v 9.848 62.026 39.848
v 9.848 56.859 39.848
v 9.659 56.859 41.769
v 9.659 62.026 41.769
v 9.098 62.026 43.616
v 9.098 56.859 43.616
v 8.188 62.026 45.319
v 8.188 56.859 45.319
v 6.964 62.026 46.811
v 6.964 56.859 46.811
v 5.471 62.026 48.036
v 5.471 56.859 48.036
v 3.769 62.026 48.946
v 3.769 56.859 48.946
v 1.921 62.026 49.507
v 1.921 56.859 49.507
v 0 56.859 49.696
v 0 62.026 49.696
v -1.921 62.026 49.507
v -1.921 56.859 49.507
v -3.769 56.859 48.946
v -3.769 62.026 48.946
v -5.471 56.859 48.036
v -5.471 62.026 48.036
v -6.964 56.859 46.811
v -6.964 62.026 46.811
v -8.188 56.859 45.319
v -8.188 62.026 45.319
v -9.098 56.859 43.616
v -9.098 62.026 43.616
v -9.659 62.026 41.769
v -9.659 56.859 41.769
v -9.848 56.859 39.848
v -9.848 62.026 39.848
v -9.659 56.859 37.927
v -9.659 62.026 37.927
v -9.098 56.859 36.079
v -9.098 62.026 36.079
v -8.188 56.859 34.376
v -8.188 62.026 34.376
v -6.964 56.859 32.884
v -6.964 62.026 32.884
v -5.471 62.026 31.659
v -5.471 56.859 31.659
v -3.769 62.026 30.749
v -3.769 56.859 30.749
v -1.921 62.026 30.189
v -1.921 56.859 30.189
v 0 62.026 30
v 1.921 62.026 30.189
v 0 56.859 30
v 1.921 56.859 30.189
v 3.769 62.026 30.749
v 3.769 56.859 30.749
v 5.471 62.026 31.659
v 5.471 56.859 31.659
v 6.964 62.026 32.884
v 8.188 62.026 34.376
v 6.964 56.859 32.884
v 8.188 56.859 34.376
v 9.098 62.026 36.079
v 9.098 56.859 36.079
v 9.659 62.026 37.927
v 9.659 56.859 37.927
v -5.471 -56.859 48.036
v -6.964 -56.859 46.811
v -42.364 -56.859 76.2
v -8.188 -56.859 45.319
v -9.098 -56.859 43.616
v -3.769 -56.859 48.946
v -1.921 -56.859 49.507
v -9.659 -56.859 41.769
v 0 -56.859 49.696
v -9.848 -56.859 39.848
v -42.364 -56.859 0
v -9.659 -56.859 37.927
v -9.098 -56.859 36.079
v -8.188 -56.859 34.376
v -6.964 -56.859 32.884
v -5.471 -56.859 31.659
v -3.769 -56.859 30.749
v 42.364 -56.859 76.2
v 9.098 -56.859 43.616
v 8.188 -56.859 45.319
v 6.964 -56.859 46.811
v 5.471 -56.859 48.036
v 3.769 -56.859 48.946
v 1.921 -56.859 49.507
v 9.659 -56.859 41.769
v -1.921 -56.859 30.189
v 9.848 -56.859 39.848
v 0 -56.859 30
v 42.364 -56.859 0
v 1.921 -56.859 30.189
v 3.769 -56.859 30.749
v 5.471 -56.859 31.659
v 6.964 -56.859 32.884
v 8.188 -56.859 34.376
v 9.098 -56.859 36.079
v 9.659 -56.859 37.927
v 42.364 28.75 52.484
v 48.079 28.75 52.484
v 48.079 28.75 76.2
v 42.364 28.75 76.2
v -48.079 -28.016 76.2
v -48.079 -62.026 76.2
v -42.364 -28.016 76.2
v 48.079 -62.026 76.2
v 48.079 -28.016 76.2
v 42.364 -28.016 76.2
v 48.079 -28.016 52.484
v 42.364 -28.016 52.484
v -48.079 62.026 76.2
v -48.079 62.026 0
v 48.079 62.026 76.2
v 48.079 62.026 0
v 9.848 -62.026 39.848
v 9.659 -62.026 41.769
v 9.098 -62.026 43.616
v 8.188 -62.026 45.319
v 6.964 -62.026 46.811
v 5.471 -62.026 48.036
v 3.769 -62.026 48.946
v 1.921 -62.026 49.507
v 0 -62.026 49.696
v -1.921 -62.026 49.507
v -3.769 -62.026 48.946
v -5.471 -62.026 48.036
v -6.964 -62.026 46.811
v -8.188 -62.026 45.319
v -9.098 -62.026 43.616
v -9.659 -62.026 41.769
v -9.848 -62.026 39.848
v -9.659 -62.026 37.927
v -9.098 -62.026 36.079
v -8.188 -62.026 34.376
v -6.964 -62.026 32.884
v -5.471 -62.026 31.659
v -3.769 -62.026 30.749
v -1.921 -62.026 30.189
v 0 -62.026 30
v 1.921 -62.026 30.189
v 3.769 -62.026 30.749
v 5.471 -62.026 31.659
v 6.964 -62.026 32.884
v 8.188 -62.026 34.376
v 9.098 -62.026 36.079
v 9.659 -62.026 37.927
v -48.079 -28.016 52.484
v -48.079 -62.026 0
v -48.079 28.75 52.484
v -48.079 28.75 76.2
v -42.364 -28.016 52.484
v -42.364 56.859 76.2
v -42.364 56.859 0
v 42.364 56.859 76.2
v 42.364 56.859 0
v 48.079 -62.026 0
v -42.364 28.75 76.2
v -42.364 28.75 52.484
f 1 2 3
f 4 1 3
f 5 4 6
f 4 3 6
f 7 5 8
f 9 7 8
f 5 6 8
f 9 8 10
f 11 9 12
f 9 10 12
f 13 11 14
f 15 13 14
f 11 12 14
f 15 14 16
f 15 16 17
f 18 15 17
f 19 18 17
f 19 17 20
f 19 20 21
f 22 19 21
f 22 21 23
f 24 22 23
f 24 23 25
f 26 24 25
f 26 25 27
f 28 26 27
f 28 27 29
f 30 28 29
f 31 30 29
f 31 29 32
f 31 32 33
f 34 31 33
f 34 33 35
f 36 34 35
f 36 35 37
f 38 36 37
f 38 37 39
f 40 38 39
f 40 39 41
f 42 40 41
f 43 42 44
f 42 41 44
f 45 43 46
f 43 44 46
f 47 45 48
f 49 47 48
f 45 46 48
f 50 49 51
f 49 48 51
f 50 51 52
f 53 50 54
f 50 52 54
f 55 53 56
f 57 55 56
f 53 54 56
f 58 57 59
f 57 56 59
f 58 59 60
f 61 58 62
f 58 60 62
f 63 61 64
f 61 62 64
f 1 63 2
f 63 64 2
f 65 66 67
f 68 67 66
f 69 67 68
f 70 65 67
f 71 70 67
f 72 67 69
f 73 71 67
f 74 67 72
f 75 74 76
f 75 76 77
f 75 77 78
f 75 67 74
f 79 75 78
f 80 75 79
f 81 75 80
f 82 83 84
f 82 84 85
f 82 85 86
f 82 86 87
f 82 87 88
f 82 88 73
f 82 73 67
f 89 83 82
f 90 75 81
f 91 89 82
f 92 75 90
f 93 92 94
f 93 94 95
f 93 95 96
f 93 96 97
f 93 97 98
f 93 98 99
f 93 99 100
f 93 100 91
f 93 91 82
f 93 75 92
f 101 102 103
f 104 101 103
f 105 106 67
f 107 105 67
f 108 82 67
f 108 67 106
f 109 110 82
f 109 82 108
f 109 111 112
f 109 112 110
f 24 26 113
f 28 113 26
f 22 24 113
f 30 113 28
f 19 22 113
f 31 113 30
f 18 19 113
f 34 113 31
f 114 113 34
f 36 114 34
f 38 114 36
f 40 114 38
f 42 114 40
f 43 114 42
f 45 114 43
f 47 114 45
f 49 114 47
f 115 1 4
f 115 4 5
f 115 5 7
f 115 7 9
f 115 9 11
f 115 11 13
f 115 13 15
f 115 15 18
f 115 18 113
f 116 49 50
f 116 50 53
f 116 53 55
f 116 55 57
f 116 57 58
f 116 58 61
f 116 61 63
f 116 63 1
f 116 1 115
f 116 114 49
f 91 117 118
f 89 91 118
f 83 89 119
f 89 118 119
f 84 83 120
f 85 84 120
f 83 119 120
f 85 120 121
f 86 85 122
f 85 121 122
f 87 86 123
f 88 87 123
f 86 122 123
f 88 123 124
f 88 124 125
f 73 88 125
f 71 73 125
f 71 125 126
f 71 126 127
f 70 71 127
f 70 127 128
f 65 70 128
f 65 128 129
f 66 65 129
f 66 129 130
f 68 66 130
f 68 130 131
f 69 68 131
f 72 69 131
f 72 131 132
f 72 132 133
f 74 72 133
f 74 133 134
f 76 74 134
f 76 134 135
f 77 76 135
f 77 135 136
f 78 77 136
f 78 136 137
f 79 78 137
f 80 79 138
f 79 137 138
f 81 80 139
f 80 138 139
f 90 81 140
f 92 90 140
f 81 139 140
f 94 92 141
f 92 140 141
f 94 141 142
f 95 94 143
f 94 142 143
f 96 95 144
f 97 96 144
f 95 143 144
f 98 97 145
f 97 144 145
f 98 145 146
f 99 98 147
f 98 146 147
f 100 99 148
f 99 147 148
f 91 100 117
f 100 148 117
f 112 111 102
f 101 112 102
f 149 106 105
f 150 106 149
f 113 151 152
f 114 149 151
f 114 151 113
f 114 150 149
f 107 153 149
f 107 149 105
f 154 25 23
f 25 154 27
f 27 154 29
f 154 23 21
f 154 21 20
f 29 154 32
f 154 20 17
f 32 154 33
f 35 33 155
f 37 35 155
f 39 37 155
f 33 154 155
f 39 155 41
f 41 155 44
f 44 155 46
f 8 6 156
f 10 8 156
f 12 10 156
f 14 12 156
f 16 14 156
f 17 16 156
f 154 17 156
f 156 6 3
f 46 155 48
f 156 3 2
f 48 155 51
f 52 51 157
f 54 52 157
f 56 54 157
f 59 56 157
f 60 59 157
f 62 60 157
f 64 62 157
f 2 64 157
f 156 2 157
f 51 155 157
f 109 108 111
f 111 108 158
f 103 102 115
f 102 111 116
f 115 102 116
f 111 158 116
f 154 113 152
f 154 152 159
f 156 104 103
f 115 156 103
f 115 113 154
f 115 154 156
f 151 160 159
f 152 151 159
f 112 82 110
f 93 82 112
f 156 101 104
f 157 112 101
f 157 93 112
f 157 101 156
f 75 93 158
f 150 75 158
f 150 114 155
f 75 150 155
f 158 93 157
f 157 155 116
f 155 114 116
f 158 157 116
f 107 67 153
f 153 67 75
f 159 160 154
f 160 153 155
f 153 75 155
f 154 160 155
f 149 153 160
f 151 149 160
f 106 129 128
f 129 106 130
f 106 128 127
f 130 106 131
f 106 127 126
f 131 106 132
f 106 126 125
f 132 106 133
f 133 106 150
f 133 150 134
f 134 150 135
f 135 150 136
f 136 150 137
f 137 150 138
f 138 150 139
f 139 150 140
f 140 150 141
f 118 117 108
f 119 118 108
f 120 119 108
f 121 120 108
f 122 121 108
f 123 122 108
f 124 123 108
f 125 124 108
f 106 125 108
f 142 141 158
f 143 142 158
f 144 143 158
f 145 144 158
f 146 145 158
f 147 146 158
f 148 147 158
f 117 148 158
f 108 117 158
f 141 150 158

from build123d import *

# Parameters (mm, degrees)
F0_W     = 96.15881
F0_H     = 124.052196
F0_W_2   = 84.728866
F0_H_2   = 113.717616
F1_DEPTH = 76.2
F2_R     = 9.848118
F3_DEPTH = 127
F4_W     = 56.765504
F4_H     = 23.716378
F5_DEPTH = 127


with BuildPart() as f1:
    # F0 (on Top) → F1 (new body)
    with BuildSketch(Plane.XY):
        Rectangle(F0_W, F0_H)
        Rectangle(F0_W_2, F0_H_2, mode=Mode.SUBTRACT)
    extrude(amount=F1_DEPTH)

    # F2 (on face) → F3 (cut)
    with BuildSketch(Plane.XZ.offset(62.026098)):
        with Locations((0, 39.847784)):
            Circle(F2_R)
    extrude(amount=-F3_DEPTH, mode=Mode.SUBTRACT)

    # F4 (on face) → F5 (cut)
    with BuildSketch(Plane.YZ.offset(48.079405)):
        with Locations((0.367016, 64.341811)):
            Rectangle(F4_W, F4_H)
    extrude(amount=-F5_DEPTH, mode=Mode.SUBTRACT)


solid = f1.part
